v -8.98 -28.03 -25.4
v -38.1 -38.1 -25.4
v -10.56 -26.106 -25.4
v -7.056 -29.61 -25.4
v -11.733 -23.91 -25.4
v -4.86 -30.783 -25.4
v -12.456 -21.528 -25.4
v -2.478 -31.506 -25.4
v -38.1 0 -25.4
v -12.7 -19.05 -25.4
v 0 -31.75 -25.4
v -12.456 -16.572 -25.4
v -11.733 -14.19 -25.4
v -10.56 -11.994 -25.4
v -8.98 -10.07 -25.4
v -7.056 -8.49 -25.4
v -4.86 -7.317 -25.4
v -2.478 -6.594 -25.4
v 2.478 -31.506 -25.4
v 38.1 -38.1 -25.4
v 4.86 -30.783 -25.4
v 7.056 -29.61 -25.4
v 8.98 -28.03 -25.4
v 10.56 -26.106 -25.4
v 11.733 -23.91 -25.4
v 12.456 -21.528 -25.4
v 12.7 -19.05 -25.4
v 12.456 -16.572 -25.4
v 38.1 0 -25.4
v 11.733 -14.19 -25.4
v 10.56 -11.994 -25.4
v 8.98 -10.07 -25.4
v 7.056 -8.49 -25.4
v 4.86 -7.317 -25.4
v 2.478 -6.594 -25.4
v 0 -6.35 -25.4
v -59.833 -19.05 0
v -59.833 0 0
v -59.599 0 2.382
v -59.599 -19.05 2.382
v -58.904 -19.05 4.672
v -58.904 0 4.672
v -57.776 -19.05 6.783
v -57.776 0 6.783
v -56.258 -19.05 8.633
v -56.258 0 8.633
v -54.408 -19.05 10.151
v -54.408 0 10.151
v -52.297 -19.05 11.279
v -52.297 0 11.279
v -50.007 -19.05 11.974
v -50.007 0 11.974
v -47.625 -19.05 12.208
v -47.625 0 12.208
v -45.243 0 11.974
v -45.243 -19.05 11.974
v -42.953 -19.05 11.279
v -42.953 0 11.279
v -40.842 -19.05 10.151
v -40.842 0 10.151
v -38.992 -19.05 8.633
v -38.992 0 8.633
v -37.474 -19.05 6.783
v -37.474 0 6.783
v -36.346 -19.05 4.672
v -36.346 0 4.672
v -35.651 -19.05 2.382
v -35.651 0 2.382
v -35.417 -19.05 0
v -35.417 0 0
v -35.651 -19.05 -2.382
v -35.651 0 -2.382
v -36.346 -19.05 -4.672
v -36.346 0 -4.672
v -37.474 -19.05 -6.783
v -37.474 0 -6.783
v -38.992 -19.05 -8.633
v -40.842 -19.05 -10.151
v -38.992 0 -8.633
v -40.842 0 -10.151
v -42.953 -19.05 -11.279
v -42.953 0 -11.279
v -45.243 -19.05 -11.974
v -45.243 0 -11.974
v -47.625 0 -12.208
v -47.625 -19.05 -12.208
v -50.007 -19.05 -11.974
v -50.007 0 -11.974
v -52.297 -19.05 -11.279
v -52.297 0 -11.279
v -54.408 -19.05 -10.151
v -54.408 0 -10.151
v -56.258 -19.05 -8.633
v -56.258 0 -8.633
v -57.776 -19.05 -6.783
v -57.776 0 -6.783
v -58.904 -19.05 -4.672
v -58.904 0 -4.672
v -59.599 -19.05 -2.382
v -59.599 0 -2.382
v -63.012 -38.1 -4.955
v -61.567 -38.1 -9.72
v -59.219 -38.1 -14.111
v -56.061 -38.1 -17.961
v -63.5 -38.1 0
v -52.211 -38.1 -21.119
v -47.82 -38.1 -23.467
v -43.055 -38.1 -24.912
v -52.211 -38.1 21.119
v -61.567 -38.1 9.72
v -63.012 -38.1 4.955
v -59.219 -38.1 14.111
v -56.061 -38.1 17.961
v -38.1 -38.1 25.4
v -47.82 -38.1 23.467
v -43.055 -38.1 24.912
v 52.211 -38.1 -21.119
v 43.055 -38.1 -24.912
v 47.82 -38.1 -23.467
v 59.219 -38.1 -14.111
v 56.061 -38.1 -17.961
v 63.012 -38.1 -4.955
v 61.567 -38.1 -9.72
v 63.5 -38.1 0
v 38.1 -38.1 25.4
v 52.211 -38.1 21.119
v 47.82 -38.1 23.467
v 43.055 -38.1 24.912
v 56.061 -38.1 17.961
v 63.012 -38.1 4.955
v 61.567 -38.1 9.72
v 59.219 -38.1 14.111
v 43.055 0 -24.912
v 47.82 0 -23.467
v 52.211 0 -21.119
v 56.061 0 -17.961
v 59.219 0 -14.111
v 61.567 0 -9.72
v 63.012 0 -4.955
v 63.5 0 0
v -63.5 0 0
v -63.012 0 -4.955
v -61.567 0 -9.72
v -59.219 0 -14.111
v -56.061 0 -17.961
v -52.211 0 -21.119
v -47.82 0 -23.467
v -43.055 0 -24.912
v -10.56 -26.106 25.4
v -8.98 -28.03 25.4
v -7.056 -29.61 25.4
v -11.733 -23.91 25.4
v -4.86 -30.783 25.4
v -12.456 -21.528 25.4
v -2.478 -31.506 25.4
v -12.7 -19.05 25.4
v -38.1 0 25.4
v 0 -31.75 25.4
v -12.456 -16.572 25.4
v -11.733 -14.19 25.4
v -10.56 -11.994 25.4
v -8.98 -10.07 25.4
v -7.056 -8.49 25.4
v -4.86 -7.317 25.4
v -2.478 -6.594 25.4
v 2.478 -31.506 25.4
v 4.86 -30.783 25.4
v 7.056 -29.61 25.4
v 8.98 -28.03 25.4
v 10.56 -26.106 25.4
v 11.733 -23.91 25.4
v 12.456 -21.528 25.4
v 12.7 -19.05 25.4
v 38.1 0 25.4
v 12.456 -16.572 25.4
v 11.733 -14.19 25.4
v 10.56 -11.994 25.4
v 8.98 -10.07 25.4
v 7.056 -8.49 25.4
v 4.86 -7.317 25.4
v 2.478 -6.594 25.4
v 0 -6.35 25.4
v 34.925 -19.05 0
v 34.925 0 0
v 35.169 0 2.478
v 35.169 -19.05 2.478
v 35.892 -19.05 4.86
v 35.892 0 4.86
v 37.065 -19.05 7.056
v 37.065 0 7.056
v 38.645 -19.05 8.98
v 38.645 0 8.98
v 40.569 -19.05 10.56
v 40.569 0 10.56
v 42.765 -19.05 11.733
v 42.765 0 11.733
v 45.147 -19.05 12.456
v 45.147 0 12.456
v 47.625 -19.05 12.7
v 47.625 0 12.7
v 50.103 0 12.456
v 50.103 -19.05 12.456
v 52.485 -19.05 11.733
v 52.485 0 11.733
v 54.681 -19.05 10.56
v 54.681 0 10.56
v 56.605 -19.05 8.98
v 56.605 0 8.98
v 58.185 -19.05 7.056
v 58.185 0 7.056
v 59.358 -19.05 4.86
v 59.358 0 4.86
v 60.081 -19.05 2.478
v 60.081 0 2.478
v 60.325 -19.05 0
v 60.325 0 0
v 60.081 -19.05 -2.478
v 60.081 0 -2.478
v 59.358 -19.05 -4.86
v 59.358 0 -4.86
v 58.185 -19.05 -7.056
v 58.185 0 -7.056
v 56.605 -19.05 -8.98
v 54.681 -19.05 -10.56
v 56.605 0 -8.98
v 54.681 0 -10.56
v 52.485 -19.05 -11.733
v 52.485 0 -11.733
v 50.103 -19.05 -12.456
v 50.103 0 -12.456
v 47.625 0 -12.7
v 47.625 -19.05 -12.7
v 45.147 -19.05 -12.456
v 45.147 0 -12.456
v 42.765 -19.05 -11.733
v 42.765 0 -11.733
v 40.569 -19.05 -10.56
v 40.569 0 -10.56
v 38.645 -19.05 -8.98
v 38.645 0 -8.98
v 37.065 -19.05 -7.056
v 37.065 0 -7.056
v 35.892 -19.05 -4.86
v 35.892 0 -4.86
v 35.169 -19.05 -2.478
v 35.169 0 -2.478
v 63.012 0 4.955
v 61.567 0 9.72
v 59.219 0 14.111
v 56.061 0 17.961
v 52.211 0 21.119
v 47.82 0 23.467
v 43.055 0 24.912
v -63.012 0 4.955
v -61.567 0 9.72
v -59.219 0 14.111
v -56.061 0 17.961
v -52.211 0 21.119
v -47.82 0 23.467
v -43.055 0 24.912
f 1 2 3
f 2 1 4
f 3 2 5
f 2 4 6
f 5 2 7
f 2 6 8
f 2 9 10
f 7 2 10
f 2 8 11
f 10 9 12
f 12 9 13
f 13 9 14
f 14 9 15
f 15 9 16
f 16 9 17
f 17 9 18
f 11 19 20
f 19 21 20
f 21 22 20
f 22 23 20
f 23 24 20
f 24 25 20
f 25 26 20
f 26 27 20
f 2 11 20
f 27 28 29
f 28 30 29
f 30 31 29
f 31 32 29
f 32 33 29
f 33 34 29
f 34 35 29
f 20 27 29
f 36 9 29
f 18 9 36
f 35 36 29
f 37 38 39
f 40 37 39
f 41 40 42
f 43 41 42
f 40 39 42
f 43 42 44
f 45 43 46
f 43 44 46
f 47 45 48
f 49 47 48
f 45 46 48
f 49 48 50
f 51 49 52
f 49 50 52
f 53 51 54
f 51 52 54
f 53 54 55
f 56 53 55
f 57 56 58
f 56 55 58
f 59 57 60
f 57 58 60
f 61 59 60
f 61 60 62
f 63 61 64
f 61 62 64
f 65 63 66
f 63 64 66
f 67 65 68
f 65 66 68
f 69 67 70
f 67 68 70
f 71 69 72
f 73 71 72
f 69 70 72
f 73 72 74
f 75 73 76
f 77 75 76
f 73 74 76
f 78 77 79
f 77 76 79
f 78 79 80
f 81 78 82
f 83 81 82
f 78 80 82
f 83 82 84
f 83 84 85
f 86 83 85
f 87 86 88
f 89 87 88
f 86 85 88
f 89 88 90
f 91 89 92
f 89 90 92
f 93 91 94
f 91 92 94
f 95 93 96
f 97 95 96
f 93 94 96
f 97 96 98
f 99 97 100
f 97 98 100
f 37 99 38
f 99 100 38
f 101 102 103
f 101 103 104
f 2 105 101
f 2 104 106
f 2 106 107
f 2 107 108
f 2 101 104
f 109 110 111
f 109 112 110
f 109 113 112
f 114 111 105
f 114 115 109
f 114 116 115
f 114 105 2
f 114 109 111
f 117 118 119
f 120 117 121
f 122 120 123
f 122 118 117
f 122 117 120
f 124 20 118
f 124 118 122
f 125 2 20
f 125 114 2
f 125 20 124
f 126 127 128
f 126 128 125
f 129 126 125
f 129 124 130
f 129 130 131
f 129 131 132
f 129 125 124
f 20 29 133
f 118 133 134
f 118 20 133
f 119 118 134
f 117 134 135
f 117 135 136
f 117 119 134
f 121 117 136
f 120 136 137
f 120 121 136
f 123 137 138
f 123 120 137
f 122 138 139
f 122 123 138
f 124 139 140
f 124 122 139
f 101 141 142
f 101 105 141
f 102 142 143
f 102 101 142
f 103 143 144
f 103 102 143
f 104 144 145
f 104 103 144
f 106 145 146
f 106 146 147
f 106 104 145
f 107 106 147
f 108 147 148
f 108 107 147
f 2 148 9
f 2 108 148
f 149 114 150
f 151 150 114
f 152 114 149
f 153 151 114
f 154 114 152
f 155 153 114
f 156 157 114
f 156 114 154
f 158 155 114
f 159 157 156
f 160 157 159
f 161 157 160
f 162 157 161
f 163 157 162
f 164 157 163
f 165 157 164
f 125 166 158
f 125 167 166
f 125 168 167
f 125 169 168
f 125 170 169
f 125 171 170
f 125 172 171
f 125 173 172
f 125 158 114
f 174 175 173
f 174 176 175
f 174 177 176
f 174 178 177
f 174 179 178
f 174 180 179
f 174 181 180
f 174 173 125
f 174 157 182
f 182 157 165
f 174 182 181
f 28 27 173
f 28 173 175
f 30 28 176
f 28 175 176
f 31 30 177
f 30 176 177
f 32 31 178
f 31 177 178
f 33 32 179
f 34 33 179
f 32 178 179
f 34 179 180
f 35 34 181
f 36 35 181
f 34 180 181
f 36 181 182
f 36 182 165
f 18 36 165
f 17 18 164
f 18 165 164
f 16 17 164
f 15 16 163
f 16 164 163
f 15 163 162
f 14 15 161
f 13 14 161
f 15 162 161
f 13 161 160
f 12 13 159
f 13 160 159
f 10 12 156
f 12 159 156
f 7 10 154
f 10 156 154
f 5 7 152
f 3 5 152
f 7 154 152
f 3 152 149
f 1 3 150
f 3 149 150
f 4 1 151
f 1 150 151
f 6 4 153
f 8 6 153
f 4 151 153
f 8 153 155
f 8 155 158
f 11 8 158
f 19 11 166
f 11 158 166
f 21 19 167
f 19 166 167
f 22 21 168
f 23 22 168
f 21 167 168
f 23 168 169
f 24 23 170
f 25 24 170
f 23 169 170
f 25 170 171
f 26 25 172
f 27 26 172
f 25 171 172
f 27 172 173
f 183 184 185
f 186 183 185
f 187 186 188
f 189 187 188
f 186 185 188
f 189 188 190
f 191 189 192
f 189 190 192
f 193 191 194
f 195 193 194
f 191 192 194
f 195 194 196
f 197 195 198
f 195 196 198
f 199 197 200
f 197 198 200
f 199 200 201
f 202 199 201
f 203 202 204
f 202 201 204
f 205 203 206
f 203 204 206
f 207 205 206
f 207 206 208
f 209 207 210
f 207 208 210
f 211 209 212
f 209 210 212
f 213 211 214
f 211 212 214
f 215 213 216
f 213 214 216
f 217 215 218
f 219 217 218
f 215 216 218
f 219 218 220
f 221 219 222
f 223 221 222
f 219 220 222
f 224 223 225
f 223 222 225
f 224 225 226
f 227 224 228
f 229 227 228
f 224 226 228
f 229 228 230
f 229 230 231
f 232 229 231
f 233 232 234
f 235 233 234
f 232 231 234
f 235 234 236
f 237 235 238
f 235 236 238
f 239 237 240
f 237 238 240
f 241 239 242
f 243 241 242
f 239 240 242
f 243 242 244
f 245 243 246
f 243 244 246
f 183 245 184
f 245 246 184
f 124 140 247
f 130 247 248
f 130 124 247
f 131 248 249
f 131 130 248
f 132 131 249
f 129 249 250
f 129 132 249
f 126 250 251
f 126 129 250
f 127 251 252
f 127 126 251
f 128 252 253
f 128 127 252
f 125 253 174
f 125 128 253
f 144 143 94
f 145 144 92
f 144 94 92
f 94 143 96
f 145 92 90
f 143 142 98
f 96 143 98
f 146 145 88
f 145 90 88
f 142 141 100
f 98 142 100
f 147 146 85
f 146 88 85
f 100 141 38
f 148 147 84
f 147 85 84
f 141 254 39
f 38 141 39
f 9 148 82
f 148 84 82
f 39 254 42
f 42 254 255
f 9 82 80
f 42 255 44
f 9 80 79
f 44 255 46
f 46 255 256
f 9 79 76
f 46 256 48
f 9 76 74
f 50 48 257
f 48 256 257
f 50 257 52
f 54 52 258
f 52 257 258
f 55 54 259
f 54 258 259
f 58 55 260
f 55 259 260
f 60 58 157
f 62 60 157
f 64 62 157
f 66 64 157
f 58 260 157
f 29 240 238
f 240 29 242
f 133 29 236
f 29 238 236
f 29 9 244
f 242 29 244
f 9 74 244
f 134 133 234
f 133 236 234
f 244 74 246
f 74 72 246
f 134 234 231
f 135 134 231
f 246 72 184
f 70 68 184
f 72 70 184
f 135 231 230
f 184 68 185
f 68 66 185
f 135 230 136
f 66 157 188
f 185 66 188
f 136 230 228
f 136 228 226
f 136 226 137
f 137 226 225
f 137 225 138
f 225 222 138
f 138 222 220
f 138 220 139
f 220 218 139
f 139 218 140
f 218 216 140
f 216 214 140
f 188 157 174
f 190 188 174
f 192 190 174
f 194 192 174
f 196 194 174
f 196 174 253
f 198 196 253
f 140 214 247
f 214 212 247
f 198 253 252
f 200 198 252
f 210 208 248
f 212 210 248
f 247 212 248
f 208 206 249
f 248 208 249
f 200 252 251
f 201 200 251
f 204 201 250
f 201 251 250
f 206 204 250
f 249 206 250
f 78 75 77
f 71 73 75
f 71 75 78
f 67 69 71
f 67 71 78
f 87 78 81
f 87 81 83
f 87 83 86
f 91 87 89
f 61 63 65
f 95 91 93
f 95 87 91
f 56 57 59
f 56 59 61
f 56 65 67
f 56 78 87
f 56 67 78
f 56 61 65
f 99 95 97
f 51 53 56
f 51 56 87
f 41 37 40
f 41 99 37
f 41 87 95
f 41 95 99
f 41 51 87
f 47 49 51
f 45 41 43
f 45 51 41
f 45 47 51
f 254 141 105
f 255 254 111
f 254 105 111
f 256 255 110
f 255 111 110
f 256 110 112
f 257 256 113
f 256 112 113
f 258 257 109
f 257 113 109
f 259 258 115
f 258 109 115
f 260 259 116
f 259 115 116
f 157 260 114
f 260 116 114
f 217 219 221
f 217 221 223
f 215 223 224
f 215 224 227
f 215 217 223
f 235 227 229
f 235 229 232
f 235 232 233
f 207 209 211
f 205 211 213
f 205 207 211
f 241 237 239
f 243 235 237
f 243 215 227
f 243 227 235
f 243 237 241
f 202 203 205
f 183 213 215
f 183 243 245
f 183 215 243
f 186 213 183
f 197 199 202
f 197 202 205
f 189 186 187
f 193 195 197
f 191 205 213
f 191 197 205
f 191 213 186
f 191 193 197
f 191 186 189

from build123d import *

# Parameters (mm, degrees)
F0_W     = 127
F0_H     = 50.8
F1_DEPTH = 38.1
F2_R     = 25.39999
F3_R     = 12.2082879552
F3_R_2   = 12.7
F4_DEPTH = 19.05
F5_R     = 12.7
F6_DEPTH = 50.8


# Not quite as in the source:
# - a fillet or chamfer is up to 0.001 mm smaller than in the source, because OpenCascade refuses the exact size


with BuildPart() as f1:
    # F0 (on Front) → F1 (new body)
    with BuildSketch(Plane.XZ):
        Rectangle(F0_W, F0_H)
    extrude(amount=F1_DEPTH)

    # F2 (radius 25.4 in the source; OpenCascade refuses exactly that, so slightly less here)
    f2_edges = [f1.edges().sort_by_distance(p)[0] for p in [
        (63.5, -19.05, 25.4),
        (63.5, -19.05, -25.4),
        (-63.5, -19.05, 25.4),
        (-63.5, -19.05, -25.4),
    ]]
    fillet(f2_edges, radius=F2_R)

    # F3 (on face) → F4 (cut)
    with BuildSketch(Plane(origin=(0, 0, 0), x_dir=(-1, 0, 0), z_dir=(0, 1, 0))):
        with Locations((47.625, 0)):
            Circle(F3_R)
        with Locations((-47.625, 0)):
            Circle(F3_R_2)
    extrude(amount=-F4_DEPTH, mode=Mode.SUBTRACT)

    # F5 (on face) → F6 (cut)
    with BuildSketch(Plane.XY.offset(25.4)):
        with Locations((0, -19.05)):
            Circle(F5_R)
    extrude(amount=-F6_DEPTH, mode=Mode.SUBTRACT)


solid = f1.part
